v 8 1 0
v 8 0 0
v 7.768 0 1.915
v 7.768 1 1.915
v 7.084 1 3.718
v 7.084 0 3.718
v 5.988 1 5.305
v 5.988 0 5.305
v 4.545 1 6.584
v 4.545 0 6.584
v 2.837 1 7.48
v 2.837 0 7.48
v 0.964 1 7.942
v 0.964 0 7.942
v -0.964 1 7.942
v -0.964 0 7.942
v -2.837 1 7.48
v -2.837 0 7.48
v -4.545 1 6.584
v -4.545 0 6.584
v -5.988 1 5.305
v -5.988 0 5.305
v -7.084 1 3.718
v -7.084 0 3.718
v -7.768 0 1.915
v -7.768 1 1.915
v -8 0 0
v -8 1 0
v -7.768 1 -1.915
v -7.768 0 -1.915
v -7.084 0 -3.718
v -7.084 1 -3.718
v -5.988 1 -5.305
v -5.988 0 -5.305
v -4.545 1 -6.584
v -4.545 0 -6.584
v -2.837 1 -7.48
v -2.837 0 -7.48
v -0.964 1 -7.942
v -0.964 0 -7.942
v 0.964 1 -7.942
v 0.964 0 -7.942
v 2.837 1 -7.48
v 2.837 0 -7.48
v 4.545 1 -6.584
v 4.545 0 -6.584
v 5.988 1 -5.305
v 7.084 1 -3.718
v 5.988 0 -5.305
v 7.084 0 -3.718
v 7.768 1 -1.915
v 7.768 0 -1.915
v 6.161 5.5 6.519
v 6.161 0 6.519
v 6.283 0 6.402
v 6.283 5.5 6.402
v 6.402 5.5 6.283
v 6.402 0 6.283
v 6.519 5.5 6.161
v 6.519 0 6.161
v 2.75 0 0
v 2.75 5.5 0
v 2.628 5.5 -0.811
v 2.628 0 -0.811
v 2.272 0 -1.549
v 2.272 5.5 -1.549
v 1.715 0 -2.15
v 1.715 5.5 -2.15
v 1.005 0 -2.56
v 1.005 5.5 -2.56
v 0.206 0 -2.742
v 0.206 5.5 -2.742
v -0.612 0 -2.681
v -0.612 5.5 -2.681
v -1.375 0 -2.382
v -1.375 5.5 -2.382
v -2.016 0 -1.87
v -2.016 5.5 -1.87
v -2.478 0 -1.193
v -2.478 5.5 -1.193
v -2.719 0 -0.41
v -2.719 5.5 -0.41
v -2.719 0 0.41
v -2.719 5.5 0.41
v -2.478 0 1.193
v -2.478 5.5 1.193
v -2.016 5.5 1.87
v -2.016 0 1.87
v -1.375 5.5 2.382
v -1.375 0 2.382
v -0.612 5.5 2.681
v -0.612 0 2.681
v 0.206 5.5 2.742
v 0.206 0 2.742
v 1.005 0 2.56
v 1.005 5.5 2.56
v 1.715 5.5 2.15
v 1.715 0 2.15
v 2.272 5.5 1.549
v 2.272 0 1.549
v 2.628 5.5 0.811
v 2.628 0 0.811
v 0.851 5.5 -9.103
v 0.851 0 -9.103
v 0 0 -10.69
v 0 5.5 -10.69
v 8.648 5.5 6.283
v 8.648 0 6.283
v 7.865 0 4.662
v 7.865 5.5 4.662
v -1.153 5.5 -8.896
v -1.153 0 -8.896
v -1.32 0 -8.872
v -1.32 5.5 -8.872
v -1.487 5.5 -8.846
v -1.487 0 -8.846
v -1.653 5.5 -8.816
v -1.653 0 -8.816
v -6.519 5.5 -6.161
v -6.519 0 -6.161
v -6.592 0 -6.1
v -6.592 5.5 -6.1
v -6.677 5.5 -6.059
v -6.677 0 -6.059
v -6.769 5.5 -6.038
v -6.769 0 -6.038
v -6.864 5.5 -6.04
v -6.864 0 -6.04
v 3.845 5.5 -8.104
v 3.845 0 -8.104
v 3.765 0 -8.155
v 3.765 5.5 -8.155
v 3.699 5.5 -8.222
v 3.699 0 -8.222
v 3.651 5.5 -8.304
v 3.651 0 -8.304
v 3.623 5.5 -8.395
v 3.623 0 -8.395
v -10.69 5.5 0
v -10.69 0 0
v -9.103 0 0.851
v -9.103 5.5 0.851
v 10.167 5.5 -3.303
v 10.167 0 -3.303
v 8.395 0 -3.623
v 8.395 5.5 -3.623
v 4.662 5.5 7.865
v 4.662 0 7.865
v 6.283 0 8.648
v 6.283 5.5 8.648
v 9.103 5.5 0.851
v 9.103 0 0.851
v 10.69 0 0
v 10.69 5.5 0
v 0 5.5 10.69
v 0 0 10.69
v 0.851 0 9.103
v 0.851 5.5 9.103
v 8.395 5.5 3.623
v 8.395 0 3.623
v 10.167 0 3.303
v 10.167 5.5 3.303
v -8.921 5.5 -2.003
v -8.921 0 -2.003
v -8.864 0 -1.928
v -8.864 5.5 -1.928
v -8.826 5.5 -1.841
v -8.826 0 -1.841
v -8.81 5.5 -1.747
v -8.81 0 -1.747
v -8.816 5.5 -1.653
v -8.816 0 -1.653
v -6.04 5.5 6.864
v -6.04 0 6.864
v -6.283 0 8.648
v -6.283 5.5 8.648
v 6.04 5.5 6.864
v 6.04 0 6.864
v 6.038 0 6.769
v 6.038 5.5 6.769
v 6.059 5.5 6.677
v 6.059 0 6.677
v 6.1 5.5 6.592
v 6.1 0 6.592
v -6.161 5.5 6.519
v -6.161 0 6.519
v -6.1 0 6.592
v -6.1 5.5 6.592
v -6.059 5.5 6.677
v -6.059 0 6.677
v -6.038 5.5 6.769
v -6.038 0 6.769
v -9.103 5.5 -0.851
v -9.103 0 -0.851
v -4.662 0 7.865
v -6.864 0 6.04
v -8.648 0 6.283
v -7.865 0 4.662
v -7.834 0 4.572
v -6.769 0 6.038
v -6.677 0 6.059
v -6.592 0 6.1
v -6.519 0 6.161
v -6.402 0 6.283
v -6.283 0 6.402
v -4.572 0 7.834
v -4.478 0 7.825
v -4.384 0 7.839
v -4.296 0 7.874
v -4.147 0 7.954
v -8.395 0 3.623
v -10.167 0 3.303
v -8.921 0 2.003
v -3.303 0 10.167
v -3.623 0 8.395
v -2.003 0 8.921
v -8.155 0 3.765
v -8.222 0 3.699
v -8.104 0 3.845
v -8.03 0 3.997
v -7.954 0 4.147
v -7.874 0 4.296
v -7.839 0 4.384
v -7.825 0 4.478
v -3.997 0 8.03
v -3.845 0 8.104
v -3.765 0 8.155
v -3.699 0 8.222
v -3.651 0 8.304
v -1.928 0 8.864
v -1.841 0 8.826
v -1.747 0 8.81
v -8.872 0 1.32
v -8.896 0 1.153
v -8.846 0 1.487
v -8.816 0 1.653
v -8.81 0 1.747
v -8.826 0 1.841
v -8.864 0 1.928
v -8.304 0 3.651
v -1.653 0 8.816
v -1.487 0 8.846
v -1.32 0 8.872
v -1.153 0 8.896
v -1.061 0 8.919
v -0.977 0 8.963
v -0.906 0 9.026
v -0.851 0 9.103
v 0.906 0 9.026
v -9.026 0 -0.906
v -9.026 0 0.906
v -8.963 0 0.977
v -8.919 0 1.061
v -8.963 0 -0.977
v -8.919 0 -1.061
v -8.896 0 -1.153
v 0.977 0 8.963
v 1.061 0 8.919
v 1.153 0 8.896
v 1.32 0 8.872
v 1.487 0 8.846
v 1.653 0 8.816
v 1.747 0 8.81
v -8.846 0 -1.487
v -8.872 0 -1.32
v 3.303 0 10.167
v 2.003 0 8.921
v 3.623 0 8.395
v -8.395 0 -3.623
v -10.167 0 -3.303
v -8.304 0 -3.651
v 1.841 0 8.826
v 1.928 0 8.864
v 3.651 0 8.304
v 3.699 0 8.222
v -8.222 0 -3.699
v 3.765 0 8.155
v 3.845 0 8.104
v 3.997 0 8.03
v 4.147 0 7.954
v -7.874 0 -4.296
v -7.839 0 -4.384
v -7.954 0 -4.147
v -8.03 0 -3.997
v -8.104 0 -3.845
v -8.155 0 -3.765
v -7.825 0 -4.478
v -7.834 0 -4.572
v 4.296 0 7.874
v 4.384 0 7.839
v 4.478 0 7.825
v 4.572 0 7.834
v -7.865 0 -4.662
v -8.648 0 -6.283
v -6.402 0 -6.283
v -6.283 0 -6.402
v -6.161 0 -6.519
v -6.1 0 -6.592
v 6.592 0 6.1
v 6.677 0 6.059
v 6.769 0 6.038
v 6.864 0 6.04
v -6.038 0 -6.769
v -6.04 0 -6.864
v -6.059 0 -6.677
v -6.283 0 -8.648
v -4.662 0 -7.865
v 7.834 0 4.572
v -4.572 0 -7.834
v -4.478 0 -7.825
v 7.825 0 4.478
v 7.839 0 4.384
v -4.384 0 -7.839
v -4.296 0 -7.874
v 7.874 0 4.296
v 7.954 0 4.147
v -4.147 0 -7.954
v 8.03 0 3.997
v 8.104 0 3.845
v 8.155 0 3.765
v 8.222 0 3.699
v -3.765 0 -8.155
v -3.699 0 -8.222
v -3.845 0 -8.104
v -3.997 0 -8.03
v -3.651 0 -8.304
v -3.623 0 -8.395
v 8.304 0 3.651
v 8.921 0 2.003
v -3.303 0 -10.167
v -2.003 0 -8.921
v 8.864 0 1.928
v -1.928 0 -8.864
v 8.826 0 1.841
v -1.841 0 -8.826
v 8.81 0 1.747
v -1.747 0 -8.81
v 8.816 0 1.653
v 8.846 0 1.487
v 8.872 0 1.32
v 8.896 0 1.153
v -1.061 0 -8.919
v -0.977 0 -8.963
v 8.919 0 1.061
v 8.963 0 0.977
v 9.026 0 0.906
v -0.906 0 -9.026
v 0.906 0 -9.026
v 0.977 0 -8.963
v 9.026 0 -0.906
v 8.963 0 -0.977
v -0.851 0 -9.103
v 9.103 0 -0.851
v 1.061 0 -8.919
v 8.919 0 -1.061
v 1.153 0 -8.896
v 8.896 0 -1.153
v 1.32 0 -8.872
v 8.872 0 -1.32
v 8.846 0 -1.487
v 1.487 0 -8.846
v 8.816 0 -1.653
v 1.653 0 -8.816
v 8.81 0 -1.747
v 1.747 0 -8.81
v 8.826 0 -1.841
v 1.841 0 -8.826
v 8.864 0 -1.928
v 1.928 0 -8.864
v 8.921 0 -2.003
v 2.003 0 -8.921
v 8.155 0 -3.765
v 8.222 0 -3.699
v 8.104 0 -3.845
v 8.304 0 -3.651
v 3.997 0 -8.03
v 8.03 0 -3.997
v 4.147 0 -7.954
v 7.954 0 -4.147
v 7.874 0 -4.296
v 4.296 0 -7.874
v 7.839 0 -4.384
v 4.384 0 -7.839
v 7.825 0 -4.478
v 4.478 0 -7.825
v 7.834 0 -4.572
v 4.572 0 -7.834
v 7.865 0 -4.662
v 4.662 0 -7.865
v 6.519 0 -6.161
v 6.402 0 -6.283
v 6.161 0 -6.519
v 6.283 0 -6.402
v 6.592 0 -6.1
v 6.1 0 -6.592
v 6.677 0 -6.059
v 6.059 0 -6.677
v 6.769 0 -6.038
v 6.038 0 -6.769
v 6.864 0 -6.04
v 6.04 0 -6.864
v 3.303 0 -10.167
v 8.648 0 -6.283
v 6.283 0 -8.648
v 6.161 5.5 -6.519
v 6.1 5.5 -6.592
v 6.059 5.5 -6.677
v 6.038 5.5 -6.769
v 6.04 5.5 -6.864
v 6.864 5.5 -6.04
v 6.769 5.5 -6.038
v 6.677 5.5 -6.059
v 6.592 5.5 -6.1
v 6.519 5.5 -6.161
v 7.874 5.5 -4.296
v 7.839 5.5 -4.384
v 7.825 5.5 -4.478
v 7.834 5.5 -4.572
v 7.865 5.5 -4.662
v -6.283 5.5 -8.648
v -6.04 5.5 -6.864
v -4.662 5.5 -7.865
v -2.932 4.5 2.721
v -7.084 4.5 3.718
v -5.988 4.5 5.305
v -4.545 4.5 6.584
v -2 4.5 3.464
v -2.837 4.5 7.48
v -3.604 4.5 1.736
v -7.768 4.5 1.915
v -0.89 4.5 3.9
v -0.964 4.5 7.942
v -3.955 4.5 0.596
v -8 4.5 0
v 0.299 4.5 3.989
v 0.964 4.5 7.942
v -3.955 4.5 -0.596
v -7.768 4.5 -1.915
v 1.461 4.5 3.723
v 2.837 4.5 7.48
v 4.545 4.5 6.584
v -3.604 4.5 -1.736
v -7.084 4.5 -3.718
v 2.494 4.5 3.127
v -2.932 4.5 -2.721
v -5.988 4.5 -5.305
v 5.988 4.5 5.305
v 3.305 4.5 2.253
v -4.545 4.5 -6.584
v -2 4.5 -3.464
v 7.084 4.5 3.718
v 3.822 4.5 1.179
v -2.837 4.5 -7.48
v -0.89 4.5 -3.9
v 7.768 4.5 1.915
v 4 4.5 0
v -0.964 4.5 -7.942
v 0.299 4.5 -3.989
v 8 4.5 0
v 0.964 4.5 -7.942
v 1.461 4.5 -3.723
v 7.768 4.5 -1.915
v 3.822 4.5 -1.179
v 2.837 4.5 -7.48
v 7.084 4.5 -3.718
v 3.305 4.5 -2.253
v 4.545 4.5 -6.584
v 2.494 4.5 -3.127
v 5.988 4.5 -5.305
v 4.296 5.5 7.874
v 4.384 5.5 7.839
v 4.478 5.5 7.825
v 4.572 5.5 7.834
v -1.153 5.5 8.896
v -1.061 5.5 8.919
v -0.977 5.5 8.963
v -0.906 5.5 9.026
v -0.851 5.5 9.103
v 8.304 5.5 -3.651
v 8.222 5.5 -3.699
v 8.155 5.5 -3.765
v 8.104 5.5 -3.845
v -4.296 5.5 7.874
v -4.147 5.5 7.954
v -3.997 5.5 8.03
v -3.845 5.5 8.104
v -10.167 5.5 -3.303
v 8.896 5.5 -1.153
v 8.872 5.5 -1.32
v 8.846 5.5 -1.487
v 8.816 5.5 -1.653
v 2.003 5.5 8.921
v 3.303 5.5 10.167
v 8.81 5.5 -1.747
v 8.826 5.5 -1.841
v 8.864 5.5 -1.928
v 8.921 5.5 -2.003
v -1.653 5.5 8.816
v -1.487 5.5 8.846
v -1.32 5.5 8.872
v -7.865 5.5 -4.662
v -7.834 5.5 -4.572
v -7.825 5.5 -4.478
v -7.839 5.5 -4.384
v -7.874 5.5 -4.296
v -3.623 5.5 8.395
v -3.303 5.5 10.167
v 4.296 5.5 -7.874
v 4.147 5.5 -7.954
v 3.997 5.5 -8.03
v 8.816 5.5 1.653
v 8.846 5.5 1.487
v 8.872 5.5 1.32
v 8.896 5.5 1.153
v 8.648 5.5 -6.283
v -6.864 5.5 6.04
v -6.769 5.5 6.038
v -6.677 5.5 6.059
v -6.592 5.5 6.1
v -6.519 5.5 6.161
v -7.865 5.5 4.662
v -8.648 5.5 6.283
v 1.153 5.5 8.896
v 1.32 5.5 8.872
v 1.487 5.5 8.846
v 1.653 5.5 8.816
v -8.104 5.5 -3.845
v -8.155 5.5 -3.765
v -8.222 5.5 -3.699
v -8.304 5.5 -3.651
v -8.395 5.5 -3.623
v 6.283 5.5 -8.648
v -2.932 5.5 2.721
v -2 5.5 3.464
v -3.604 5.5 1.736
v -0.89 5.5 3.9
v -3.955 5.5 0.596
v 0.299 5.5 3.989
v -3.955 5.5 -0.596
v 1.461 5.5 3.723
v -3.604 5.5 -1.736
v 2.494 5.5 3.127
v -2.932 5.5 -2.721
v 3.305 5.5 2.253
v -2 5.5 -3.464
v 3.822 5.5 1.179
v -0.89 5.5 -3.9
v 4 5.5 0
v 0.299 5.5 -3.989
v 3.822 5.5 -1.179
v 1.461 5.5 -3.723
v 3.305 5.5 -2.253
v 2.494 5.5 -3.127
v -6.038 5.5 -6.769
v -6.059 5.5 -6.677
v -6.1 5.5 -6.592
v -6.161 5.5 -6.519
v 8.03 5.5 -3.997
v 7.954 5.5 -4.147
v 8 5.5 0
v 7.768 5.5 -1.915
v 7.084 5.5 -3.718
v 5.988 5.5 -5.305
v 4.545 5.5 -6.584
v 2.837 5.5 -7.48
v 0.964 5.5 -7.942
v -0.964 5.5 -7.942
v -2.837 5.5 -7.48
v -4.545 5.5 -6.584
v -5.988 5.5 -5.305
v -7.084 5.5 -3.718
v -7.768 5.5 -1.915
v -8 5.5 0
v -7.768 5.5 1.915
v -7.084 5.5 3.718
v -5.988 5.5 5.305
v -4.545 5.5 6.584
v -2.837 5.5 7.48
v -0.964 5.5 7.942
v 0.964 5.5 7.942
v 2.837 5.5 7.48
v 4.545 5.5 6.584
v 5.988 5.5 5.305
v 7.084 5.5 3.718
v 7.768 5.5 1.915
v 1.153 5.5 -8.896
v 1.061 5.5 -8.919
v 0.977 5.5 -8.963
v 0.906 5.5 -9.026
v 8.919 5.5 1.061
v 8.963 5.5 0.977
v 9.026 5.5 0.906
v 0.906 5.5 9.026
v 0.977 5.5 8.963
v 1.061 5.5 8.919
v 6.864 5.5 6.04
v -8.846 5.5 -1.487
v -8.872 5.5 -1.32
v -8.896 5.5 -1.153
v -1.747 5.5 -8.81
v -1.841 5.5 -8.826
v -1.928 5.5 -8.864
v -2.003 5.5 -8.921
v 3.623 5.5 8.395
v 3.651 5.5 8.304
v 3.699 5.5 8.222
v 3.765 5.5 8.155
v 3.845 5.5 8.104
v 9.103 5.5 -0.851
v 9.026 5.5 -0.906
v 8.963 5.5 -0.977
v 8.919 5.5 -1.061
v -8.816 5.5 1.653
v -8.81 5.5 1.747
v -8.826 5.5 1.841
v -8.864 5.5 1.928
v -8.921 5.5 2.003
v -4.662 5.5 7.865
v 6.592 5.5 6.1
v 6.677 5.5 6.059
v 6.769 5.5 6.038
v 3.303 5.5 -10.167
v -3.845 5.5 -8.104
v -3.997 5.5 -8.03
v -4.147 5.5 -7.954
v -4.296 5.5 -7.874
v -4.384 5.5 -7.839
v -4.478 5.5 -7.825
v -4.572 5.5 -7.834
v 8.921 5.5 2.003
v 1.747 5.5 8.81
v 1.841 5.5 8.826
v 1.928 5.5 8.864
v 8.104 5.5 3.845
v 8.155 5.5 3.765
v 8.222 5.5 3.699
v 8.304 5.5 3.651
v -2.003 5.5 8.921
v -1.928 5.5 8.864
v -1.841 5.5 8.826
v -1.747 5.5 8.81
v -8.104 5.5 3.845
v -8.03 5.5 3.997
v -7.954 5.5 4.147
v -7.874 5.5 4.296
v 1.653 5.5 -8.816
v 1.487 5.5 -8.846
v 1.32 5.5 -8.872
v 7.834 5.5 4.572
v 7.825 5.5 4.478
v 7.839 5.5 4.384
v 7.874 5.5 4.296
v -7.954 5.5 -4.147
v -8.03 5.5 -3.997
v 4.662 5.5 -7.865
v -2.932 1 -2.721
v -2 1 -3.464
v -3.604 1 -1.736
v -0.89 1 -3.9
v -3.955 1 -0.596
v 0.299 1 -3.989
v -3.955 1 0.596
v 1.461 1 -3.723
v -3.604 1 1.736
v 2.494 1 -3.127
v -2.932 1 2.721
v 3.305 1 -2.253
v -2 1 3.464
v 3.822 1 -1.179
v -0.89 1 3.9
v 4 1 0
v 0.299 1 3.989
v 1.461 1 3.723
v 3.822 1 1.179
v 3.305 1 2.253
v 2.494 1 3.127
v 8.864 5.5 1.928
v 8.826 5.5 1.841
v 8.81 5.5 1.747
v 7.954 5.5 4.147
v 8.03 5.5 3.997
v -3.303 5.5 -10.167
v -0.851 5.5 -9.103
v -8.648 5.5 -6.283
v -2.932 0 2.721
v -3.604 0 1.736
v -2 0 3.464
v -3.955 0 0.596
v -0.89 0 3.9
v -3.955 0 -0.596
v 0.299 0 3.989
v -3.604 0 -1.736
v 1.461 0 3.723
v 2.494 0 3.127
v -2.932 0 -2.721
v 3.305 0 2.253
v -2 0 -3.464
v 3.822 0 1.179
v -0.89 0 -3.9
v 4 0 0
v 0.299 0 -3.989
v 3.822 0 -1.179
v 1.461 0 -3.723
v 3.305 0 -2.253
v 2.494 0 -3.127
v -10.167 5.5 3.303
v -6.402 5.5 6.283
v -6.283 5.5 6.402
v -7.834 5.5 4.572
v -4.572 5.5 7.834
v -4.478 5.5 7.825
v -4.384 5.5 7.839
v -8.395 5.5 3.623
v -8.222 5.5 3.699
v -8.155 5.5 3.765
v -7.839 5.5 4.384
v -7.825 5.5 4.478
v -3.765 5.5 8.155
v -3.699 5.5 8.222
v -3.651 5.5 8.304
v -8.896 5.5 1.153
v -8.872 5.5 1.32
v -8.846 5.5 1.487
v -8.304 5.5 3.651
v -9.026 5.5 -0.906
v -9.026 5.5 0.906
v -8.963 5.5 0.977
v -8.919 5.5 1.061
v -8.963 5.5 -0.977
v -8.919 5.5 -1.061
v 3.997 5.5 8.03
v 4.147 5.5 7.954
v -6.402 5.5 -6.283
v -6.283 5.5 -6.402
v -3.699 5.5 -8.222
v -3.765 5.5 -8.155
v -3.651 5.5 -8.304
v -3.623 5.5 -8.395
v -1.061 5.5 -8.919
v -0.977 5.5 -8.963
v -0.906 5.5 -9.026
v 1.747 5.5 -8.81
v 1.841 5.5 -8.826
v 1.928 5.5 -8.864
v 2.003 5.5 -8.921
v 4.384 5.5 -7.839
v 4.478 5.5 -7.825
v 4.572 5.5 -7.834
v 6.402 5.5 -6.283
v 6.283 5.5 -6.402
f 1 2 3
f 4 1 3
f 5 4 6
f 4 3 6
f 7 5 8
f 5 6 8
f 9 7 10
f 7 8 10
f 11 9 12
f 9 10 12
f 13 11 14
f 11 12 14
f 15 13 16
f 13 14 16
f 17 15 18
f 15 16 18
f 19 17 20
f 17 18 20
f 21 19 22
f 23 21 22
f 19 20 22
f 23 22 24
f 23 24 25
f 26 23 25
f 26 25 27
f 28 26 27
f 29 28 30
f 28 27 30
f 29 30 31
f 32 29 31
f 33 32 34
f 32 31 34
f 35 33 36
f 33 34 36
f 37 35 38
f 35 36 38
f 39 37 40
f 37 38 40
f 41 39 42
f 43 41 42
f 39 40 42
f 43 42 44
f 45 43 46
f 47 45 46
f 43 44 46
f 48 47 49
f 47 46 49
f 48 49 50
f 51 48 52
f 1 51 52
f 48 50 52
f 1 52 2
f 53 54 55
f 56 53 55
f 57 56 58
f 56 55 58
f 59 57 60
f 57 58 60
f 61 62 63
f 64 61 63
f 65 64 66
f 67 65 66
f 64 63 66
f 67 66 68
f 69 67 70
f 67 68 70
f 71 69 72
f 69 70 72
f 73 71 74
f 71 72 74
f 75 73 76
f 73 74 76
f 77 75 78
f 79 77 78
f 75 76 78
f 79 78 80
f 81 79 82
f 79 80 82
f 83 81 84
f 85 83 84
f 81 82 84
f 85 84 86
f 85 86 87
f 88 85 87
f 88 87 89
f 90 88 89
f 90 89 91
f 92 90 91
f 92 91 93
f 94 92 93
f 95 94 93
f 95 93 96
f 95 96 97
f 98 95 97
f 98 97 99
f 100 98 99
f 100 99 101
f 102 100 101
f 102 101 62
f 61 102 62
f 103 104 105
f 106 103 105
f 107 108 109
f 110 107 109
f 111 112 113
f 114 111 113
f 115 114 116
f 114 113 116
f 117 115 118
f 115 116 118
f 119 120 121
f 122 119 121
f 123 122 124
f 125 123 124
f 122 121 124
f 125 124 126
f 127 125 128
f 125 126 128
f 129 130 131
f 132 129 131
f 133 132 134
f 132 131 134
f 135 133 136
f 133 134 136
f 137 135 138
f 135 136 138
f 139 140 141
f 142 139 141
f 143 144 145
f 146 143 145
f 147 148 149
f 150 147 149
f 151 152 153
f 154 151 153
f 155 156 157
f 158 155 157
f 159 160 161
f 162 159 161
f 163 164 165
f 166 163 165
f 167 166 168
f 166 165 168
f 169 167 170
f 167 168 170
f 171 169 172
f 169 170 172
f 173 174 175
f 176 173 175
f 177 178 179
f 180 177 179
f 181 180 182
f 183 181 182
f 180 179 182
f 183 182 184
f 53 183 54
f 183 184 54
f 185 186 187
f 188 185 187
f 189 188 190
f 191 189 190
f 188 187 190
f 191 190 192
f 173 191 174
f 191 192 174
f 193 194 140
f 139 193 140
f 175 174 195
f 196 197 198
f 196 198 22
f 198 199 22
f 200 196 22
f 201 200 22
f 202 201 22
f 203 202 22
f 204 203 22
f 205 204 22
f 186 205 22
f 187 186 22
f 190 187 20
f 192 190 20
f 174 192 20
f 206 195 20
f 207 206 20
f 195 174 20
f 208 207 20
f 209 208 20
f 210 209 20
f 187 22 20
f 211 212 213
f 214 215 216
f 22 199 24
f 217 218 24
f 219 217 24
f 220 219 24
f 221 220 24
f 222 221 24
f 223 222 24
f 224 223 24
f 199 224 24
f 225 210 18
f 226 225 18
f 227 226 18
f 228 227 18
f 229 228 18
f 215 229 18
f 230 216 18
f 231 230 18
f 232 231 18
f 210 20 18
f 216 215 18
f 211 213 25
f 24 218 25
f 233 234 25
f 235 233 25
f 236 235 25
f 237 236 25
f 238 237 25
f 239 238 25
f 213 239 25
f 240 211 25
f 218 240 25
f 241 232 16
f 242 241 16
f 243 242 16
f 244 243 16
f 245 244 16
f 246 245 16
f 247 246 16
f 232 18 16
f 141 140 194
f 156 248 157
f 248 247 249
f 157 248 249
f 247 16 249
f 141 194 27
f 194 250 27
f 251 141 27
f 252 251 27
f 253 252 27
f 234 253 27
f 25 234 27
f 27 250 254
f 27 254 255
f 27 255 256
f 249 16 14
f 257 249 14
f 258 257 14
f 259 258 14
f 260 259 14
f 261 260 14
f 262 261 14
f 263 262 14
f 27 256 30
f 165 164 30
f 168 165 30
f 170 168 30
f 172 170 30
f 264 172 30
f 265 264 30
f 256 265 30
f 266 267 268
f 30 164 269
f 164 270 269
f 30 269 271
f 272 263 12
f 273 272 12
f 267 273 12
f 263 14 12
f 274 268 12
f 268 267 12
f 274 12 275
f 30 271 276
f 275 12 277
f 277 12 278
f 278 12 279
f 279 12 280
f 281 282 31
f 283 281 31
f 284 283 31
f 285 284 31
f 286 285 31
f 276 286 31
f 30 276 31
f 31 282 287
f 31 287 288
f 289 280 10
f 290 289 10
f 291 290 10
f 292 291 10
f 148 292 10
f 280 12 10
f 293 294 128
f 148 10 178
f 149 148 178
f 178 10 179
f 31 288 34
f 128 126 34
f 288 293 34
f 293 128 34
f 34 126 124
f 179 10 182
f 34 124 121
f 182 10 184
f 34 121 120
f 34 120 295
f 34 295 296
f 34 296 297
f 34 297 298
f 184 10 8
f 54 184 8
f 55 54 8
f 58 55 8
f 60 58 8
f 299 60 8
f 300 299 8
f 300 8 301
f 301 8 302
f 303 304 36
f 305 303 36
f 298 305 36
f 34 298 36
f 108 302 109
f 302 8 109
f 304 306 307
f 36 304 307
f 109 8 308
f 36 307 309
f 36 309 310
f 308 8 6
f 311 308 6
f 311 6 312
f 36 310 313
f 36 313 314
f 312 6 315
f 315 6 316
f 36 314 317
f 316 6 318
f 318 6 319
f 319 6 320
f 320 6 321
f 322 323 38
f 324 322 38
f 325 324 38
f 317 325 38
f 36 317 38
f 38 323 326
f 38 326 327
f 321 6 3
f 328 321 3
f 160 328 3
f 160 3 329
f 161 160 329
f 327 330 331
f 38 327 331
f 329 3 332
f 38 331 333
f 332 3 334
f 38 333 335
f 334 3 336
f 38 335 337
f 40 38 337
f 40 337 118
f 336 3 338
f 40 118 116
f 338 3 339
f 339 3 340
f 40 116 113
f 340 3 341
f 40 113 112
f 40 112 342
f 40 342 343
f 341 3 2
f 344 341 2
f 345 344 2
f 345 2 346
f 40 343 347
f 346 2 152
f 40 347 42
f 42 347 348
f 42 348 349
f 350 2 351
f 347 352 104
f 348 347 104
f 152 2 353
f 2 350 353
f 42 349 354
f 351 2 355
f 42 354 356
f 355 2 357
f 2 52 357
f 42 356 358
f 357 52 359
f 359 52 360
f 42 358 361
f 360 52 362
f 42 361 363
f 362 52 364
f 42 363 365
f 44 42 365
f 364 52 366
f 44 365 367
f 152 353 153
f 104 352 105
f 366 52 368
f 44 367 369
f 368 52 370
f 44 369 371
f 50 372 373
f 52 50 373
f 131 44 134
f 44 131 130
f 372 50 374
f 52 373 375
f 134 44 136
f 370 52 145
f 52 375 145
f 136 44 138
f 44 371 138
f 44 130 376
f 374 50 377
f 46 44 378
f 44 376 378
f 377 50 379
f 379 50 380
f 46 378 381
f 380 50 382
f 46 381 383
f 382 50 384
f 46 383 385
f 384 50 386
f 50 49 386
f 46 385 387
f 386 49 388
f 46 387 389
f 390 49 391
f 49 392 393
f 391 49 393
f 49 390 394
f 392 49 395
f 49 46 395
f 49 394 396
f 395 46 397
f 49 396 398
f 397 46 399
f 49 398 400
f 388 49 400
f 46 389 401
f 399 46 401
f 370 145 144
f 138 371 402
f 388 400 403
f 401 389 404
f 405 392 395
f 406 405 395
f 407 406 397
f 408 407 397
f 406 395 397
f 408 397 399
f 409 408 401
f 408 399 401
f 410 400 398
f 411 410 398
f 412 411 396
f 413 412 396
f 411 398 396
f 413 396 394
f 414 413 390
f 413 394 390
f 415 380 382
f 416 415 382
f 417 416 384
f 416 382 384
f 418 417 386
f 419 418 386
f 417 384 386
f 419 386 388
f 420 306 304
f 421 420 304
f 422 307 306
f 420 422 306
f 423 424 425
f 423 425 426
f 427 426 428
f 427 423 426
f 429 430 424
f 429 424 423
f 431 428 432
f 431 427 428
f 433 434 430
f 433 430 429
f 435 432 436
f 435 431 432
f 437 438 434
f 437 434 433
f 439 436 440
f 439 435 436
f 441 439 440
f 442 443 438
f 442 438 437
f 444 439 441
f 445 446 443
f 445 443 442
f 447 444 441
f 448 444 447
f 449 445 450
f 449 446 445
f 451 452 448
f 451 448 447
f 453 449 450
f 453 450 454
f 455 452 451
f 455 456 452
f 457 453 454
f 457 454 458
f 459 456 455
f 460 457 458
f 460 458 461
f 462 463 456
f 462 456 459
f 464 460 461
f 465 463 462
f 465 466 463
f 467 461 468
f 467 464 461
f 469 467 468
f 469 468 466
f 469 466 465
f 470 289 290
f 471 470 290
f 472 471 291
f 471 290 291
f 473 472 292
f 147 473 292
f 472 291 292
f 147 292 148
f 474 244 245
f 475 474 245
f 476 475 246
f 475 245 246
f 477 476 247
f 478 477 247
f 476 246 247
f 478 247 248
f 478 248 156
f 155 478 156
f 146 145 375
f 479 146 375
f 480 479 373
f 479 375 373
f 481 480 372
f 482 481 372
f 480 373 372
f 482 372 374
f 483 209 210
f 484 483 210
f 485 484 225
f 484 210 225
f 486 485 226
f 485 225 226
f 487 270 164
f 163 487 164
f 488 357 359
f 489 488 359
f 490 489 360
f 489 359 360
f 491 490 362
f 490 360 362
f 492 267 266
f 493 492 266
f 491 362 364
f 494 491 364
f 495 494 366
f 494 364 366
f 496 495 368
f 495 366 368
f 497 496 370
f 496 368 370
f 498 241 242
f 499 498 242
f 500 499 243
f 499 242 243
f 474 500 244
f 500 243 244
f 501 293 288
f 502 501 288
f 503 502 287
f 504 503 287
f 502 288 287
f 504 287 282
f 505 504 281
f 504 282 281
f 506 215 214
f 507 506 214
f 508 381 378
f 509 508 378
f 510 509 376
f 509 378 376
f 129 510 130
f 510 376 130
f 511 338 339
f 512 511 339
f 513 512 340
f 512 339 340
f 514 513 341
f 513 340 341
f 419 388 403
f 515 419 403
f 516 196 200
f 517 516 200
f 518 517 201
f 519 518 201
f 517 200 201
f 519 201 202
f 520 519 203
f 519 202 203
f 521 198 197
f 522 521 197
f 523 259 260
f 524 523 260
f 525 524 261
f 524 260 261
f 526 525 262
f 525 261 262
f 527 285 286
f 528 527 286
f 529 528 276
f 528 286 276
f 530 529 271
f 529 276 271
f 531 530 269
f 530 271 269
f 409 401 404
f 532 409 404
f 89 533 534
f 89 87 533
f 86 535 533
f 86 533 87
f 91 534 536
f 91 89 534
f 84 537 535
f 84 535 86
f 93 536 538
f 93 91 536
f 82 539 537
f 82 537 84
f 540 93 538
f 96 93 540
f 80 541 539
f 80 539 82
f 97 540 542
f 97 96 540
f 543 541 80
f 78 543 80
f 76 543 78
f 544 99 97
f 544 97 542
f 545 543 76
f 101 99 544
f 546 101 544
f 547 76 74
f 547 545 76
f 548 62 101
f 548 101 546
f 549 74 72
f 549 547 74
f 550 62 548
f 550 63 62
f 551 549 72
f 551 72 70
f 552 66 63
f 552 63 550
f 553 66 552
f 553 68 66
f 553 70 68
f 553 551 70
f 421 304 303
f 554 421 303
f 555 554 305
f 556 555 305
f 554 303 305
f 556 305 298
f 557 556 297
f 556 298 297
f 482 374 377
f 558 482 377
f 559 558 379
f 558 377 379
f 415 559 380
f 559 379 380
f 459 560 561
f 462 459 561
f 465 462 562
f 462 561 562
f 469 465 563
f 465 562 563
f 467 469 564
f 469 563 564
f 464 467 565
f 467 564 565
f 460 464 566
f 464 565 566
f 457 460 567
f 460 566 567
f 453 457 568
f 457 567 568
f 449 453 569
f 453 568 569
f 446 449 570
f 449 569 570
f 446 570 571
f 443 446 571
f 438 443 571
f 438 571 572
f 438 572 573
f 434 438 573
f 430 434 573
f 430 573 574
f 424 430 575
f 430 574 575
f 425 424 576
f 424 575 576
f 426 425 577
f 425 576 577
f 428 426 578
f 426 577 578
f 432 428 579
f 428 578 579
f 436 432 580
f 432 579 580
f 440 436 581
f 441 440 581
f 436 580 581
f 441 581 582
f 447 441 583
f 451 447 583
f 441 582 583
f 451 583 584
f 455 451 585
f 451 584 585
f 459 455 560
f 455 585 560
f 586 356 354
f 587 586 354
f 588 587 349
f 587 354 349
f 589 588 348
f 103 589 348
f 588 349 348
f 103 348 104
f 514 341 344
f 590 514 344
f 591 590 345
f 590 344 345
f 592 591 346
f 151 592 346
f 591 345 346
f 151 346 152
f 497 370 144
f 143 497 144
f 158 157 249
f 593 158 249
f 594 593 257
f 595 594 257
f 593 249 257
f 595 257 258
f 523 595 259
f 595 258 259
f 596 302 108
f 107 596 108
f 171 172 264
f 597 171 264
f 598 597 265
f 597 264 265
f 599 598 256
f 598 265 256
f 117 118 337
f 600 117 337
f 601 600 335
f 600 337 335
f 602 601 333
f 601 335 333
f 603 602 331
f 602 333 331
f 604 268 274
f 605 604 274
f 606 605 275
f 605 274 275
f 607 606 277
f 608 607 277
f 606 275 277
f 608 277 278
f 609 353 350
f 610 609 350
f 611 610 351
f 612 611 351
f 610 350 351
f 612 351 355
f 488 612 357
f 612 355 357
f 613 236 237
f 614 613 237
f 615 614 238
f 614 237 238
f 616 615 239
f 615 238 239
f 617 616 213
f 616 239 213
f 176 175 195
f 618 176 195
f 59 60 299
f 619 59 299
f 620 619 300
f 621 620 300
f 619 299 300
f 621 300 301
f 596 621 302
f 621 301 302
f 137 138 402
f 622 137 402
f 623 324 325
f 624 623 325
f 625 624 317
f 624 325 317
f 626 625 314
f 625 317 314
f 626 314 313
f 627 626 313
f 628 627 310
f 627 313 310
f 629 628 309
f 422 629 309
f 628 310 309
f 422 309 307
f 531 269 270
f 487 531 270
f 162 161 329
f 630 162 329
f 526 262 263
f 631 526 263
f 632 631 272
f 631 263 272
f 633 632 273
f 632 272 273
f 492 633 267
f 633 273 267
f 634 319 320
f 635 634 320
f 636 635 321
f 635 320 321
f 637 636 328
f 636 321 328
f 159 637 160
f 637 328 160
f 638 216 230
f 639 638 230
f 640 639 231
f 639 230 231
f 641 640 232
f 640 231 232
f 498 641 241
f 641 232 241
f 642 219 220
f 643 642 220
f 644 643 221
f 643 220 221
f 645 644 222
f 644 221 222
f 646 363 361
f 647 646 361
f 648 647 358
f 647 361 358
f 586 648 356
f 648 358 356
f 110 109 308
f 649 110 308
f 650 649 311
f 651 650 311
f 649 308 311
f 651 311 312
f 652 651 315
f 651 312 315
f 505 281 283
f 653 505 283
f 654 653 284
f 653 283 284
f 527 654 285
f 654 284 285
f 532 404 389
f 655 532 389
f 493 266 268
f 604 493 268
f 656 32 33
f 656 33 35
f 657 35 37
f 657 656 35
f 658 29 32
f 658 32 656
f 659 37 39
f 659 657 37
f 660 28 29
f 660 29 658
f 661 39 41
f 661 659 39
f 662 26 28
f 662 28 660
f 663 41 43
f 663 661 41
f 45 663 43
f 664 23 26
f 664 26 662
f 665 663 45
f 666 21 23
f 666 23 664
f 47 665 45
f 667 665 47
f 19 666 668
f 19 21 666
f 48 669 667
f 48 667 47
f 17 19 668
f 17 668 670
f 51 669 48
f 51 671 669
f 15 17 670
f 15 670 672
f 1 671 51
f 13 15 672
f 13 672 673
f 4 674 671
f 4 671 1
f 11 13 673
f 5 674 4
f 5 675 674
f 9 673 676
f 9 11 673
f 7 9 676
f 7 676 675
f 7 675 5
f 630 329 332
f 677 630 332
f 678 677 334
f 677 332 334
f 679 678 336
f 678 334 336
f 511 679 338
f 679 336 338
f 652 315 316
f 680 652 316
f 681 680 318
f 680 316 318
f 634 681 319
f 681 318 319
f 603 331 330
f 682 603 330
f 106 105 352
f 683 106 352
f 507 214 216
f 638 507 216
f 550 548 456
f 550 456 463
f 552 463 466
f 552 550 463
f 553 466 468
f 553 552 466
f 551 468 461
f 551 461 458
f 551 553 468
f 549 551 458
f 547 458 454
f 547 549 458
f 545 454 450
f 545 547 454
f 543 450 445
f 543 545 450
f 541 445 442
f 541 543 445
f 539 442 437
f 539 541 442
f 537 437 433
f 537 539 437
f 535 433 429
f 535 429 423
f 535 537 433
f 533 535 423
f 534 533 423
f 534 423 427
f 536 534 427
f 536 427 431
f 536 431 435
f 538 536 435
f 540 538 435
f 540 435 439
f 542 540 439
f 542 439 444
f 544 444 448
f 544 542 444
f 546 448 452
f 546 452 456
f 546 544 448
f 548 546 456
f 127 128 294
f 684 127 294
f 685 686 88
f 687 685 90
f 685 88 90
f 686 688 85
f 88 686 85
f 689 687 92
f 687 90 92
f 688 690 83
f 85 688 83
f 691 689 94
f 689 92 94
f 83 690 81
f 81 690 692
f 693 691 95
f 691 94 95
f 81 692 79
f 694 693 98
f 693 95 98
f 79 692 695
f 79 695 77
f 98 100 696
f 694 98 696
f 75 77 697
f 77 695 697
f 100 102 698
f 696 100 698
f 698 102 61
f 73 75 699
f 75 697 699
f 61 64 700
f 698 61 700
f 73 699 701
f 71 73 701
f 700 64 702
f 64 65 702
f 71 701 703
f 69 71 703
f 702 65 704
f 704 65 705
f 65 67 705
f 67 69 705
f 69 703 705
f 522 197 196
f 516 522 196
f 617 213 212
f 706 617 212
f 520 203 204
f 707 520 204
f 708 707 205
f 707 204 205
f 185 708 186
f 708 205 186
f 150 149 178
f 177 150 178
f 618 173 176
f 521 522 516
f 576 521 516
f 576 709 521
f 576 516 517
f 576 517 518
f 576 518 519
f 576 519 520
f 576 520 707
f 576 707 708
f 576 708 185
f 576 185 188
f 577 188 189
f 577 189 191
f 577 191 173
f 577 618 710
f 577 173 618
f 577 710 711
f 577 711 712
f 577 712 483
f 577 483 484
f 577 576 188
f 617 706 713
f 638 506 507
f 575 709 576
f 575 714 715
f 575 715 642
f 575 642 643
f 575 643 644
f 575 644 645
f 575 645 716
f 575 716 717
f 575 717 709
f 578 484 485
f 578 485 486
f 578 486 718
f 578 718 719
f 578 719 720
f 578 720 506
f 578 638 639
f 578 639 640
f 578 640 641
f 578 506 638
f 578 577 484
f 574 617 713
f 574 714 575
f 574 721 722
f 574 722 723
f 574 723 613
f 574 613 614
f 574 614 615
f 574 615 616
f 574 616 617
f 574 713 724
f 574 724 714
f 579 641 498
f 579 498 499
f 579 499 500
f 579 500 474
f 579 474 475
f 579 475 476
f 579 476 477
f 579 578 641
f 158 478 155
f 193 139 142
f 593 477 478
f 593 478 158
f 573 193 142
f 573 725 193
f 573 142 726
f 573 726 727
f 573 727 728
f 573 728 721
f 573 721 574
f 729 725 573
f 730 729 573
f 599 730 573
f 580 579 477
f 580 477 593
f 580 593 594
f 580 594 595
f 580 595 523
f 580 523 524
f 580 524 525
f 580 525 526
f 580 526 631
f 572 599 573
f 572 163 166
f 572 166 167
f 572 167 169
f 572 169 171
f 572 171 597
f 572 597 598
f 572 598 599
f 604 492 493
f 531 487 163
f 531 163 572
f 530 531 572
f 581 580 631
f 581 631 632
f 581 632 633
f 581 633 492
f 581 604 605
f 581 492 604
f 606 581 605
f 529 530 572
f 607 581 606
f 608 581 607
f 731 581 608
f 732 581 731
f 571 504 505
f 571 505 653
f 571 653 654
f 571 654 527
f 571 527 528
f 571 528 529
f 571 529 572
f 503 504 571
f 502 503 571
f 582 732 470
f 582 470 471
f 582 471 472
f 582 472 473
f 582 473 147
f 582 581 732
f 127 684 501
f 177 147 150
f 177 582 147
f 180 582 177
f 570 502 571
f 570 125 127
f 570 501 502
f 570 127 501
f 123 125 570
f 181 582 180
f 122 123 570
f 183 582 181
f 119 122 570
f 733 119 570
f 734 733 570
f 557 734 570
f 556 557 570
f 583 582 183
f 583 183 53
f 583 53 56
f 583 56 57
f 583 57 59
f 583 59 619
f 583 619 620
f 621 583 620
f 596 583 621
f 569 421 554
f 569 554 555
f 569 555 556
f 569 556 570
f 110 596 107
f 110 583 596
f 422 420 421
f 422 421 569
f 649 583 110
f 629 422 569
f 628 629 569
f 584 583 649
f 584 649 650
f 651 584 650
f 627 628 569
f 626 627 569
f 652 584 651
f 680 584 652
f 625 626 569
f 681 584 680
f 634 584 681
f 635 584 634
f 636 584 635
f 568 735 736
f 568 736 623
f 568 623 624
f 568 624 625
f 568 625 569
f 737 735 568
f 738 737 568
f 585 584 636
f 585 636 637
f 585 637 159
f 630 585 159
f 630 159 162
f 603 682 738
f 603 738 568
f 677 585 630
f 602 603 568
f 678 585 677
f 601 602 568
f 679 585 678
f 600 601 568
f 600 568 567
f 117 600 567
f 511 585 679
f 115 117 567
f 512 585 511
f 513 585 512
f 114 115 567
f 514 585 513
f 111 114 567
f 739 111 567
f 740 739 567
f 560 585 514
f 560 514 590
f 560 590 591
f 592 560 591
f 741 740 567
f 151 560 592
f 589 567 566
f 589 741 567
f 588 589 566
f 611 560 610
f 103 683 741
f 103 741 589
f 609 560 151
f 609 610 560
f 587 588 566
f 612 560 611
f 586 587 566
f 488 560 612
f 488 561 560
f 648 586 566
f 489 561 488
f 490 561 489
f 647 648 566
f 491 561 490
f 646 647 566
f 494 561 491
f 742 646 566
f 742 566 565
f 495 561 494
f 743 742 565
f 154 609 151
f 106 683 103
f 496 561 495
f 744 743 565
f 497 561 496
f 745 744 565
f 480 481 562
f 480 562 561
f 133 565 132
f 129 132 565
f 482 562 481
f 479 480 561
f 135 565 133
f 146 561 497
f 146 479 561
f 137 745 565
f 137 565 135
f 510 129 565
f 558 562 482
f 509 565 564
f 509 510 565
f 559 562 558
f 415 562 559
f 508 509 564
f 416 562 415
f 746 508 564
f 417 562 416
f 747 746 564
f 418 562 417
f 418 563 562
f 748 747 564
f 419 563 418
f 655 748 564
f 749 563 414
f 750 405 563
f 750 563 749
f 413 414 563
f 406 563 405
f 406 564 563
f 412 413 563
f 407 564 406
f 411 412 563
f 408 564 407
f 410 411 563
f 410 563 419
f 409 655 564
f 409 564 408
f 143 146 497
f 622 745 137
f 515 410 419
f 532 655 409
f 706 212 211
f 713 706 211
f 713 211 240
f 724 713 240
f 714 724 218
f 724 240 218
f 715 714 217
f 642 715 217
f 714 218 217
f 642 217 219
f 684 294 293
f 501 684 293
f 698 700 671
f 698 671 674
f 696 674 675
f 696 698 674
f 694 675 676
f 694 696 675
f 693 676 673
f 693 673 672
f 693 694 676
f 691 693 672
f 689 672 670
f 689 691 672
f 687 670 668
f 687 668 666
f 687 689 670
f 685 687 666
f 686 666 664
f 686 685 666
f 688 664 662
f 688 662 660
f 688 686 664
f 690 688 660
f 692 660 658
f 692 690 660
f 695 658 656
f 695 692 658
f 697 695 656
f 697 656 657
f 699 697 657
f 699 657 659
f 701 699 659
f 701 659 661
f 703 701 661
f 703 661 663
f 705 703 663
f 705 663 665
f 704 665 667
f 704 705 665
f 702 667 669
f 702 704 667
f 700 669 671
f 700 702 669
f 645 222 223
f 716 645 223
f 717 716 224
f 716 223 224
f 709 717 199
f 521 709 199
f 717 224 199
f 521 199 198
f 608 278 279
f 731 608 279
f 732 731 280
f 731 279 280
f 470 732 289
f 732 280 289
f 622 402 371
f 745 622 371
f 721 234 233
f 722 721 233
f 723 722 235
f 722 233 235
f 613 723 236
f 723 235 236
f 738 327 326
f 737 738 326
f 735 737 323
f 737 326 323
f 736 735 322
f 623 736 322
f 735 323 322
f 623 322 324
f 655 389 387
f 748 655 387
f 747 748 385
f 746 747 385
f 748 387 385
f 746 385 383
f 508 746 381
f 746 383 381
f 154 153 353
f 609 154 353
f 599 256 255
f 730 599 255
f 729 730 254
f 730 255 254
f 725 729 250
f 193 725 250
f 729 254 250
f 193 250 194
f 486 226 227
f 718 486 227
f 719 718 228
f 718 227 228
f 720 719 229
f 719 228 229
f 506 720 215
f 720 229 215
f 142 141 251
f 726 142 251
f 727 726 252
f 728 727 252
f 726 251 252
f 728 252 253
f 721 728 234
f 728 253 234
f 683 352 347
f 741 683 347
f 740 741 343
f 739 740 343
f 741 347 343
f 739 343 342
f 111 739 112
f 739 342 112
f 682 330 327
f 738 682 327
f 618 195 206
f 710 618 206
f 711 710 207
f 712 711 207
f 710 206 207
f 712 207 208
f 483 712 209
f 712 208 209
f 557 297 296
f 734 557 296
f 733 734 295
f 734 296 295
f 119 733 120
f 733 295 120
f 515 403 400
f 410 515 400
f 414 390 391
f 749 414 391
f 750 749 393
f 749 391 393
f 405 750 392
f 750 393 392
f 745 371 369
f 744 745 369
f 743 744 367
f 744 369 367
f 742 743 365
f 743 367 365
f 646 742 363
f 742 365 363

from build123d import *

# Parameters (mm, degrees)
BOSS_EXTRUDE1_DEPTH = 5.5
SKETCH2_R           = 2.75
CUT_EXTRUDE1_DEPTH  = 17.087330419
SKETCH2_3_R         = 8
SKETCH2_3_R_2       = 4
CUT_EXTRUDE2_DEPTH  = 1
CUT_EXTRUDE3_START  = -1
SKETCH3_R           = 8
SKETCH3_R_2         = 4
CUT_EXTRUDE3_DEPTH  = 1


with BuildPart() as part:
    # Sketch1 → Boss-Extrude1 (new body)
    with BuildSketch(Plane(origin=(0, 0, 0), x_dir=(1, 0, 0), z_dir=(0, 1, 0))):
        with BuildLine():
            Line((0, 10.69), (-0.851452759, 9.103207147))
            ThreePointArc((-0.851452759, 9.103207147), (-0.976880558, 8.963010217), (-1.152522076, 8.895650222))
            ThreePointArc((-1.152522076, 8.895650222), (-1.403217151, 8.859564415), (-1.652793464, 8.816415018))
            ThreePointArc((-1.652793464, 8.816415018), (-1.840653858, 8.826201967), (-2.003266017, 8.920777849))
            Line((-2.003266017, 8.920777849), (-3.30339167, 10.166794159))
            Line((-3.30339167, 10.166794159), (-3.622825406, 8.394551104))
            ThreePointArc((-3.622825406, 8.394551104), (-3.698791098, 8.222456579), (-3.845020725, 8.104117202))
            ThreePointArc((-3.845020725, 8.104117202), (-4.072294783, 7.992328522), (-4.296322064, 7.874167684))
            ThreePointArc((-4.296322064, 7.874167684), (-4.478012249, 7.825423572), (-4.661891158, 7.86512066))
            Line((-4.661891158, 7.86512066), (-6.283424347, 8.64839167))
            Line((-6.283424347, 8.64839167), (-6.039570662, 6.864177911))
            ThreePointArc((-6.039570662, 6.864177911), (-6.058638195, 6.677031601), (-6.161141956, 6.519296726))
            ThreePointArc((-6.161141956, 6.519296726), (-6.342747827, 6.342747827), (-6.519296726, 6.161141956))
            ThreePointArc((-6.519296726, 6.161141956), (-6.677031601, 6.058638195), (-6.864177911, 6.039570662))
            Line((-6.864177911, 6.039570662), (-8.64839167, 6.283424347))
            Line((-8.64839167, 6.283424347), (-7.86512066, 4.661891158))
            ThreePointArc((-7.86512066, 4.661891158), (-7.825423572, 4.478012249), (-7.874167684, 4.296322064))
            ThreePointArc((-7.874167684, 4.296322064), (-7.992328522, 4.072294783), (-8.104117202, 3.845020725))
            ThreePointArc((-8.104117202, 3.845020725), (-8.222456579, 3.698791098), (-8.394551104, 3.622825406))
            Line((-8.394551104, 3.622825406), (-10.166794159, 3.30339167))
            Line((-10.166794159, 3.30339167), (-8.920777849, 2.003266017))
            ThreePointArc((-8.920777849, 2.003266017), (-8.826201967, 1.840653858), (-8.816415018, 1.652793464))
            ThreePointArc((-8.816415018, 1.652793464), (-8.859564415, 1.403217151), (-8.895650222, 1.152522076))
            ThreePointArc((-8.895650222, 1.152522076), (-8.963010217, 0.976880558), (-9.103207147, 0.851452759))
            Line((-9.103207147, 0.851452759), (-10.69, 0))
            Line((-10.69, 0), (-9.103207147, -0.851452759))
            ThreePointArc((-9.103207147, -0.851452759), (-8.963010217, -0.976880558), (-8.895650222, -1.152522076))
            ThreePointArc((-8.895650222, -1.152522076), (-8.859564415, -1.403217151), (-8.816415018, -1.652793464))
            ThreePointArc((-8.816415018, -1.652793464), (-8.826201967, -1.840653858), (-8.920777849, -2.003266017))
            Line((-8.920777849, -2.003266017), (-10.166794159, -3.30339167))
            Line((-10.166794159, -3.30339167), (-8.394551104, -3.622825406))
            ThreePointArc((-8.394551104, -3.622825406), (-8.222456579, -3.698791098), (-8.104117202, -3.845020725))
            ThreePointArc((-8.104117202, -3.845020725), (-7.992328522, -4.072294783), (-7.874167684, -4.296322064))
            ThreePointArc((-7.874167684, -4.296322064), (-7.825423572, -4.478012249), (-7.86512066, -4.661891158))
            Line((-7.86512066, -4.661891158), (-8.64839167, -6.283424347))
            Line((-8.64839167, -6.283424347), (-6.864177911, -6.039570662))
            ThreePointArc((-6.864177911, -6.039570662), (-6.677031601, -6.058638195), (-6.519296726, -6.161141956))
            ThreePointArc((-6.519296726, -6.161141956), (-6.342747827, -6.342747827), (-6.161141956, -6.519296726))
            ThreePointArc((-6.161141956, -6.519296726), (-6.058638195, -6.677031601), (-6.039570662, -6.864177911))
            Line((-6.039570662, -6.864177911), (-6.283424347, -8.64839167))
            Line((-6.283424347, -8.64839167), (-4.661891158, -7.86512066))
            ThreePointArc((-4.661891158, -7.86512066), (-4.478012249, -7.825423572), (-4.296322064, -7.874167684))
            ThreePointArc((-4.296322064, -7.874167684), (-4.072294783, -7.992328522), (-3.845020725, -8.104117202))
            ThreePointArc((-3.845020725, -8.104117202), (-3.698791098, -8.222456579), (-3.622825406, -8.394551104))
            Line((-3.622825406, -8.394551104), (-3.30339167, -10.166794159))
            Line((-3.30339167, -10.166794159), (-2.003266017, -8.920777849))
            ThreePointArc((-2.003266017, -8.920777849), (-1.840653858, -8.826201967), (-1.652793464, -8.816415018))
            ThreePointArc((-1.652793464, -8.816415018), (-1.403217151, -8.859564415), (-1.152522076, -8.895650222))
            ThreePointArc((-1.152522076, -8.895650222), (-0.976880558, -8.963010217), (-0.851452759, -9.103207147))
            Line((-0.851452759, -9.103207147), (0, -10.69))
            Line((0, -10.69), (0.851452759, -9.103207147))
            ThreePointArc((0.851452759, -9.103207147), (0.976880558, -8.963010217), (1.152522076, -8.895650222))
            ThreePointArc((1.152522076, -8.895650222), (1.403217151, -8.859564415), (1.652793464, -8.816415018))
            ThreePointArc((1.652793464, -8.816415018), (1.840653858, -8.826201967), (2.003266017, -8.920777849))
            Line((2.003266017, -8.920777849), (3.30339167, -10.166794159))
            Line((3.30339167, -10.166794159), (3.622825406, -8.394551104))
            ThreePointArc((3.622825406, -8.394551104), (3.698791098, -8.222456579), (3.845020725, -8.104117202))
            ThreePointArc((3.845020725, -8.104117202), (4.072294783, -7.992328522), (4.296322064, -7.874167684))
            ThreePointArc((4.296322064, -7.874167684), (4.478012249, -7.825423572), (4.661891158, -7.86512066))
            Line((4.661891158, -7.86512066), (6.283424347, -8.64839167))
            Line((6.283424347, -8.64839167), (6.039570662, -6.864177911))
            ThreePointArc((6.039570662, -6.864177911), (6.058638195, -6.677031601), (6.161141956, -6.519296726))
            ThreePointArc((6.161141956, -6.519296726), (6.342747827, -6.342747827), (6.519296726, -6.161141956))
            ThreePointArc((6.519296726, -6.161141956), (6.677031601, -6.058638195), (6.864177911, -6.039570662))
            Line((6.864177911, -6.039570662), (8.64839167, -6.283424347))
            Line((8.64839167, -6.283424347), (7.86512066, -4.661891158))
            ThreePointArc((7.86512066, -4.661891158), (7.825423572, -4.478012249), (7.874167684, -4.296322064))
            ThreePointArc((7.874167684, -4.296322064), (7.992328522, -4.072294783), (8.104117202, -3.845020725))
            ThreePointArc((8.104117202, -3.845020725), (8.222456579, -3.698791098), (8.394551104, -3.622825406))
            Line((8.394551104, -3.622825406), (10.166794159, -3.30339167))
            Line((10.166794159, -3.30339167), (8.920777849, -2.003266017))
            ThreePointArc((8.920777849, -2.003266017), (8.826201967, -1.840653858), (8.816415018, -1.652793464))
            ThreePointArc((8.816415018, -1.652793464), (8.859564415, -1.403217151), (8.895650222, -1.152522076))
            ThreePointArc((8.895650222, -1.152522076), (8.963010217, -0.976880558), (9.103207147, -0.851452759))
            Line((9.103207147, -0.851452759), (10.69, 0))
            Line((10.69, 0), (9.103207147, 0.851452759))
            ThreePointArc((9.103207147, 0.851452759), (8.963010217, 0.976880558), (8.895650222, 1.152522076))
            ThreePointArc((8.895650222, 1.152522076), (8.859564415, 1.403217151), (8.816415018, 1.652793464))
            ThreePointArc((8.816415018, 1.652793464), (8.826201967, 1.840653858), (8.920777849, 2.003266017))
            Line((8.920777849, 2.003266017), (10.166794159, 3.30339167))
            Line((10.166794159, 3.30339167), (8.394551104, 3.622825406))
            ThreePointArc((8.394551104, 3.622825406), (8.222456579, 3.698791098), (8.104117202, 3.845020725))
            ThreePointArc((8.104117202, 3.845020725), (7.992328522, 4.072294783), (7.874167684, 4.296322064))
            ThreePointArc((7.874167684, 4.296322064), (7.825423572, 4.478012249), (7.86512066, 4.661891158))
            Line((7.86512066, 4.661891158), (8.64839167, 6.283424347))
            Line((8.64839167, 6.283424347), (6.864177911, 6.039570662))
            ThreePointArc((6.864177911, 6.039570662), (6.677031601, 6.058638195), (6.519296726, 6.161141956))
            ThreePointArc((6.519296726, 6.161141956), (6.342747827, 6.342747827), (6.161141956, 6.519296726))
            ThreePointArc((6.161141956, 6.519296726), (6.058638195, 6.677031601), (6.039570662, 6.864177911))
            Line((6.039570662, 6.864177911), (6.283424347, 8.64839167))
            Line((6.283424347, 8.64839167), (4.661891158, 7.86512066))
            ThreePointArc((4.661891158, 7.86512066), (4.478012249, 7.825423572), (4.296322064, 7.874167684))
            ThreePointArc((4.296322064, 7.874167684), (4.072294783, 7.992328522), (3.845020725, 8.104117202))
            ThreePointArc((3.845020725, 8.104117202), (3.698791098, 8.222456579), (3.622825406, 8.394551104))
            Line((3.622825406, 8.394551104), (3.30339167, 10.166794159))
            Line((3.30339167, 10.166794159), (2.003266017, 8.920777849))
            ThreePointArc((2.003266017, 8.920777849), (1.840653858, 8.826201967), (1.652793464, 8.816415018))
            ThreePointArc((1.652793464, 8.816415018), (1.403217151, 8.859564415), (1.152522076, 8.895650222))
            ThreePointArc((1.152522076, 8.895650222), (0.976880558, 8.963010217), (0.851452759, 9.103207147))
            Line((0.851452759, 9.103207147), (0, 10.69))
        make_face()
    extrude(amount=BOSS_EXTRUDE1_DEPTH)

    # Sketch2 → Cut-Extrude1 (cut, through all)
    with BuildSketch(Plane(origin=(0, 5.5, 0), x_dir=(1, 0, 0), z_dir=(0, 1, 0))):
        Circle(SKETCH2_R)
    extrude(amount=-CUT_EXTRUDE1_DEPTH, mode=Mode.SUBTRACT)

    # Sketch2<3> → Cut-Extrude2 (cut)
    with BuildSketch(Plane(origin=(0, 5.5, 0), x_dir=(1, 0, 0), z_dir=(0, 1, 0))):
        Circle(SKETCH2_3_R)
        Circle(SKETCH2_3_R_2, mode=Mode.SUBTRACT)
    extrude(amount=-CUT_EXTRUDE2_DEPTH, mode=Mode.SUBTRACT)

    # Sketch3 → Cut-Extrude3 (cut)
    with BuildSketch(Plane.XZ.offset(CUT_EXTRUDE3_START)):
        Circle(SKETCH3_R)
        Circle(SKETCH3_R_2, mode=Mode.SUBTRACT)
    extrude(amount=CUT_EXTRUDE3_DEPTH, mode=Mode.SUBTRACT)


solid = part.part
